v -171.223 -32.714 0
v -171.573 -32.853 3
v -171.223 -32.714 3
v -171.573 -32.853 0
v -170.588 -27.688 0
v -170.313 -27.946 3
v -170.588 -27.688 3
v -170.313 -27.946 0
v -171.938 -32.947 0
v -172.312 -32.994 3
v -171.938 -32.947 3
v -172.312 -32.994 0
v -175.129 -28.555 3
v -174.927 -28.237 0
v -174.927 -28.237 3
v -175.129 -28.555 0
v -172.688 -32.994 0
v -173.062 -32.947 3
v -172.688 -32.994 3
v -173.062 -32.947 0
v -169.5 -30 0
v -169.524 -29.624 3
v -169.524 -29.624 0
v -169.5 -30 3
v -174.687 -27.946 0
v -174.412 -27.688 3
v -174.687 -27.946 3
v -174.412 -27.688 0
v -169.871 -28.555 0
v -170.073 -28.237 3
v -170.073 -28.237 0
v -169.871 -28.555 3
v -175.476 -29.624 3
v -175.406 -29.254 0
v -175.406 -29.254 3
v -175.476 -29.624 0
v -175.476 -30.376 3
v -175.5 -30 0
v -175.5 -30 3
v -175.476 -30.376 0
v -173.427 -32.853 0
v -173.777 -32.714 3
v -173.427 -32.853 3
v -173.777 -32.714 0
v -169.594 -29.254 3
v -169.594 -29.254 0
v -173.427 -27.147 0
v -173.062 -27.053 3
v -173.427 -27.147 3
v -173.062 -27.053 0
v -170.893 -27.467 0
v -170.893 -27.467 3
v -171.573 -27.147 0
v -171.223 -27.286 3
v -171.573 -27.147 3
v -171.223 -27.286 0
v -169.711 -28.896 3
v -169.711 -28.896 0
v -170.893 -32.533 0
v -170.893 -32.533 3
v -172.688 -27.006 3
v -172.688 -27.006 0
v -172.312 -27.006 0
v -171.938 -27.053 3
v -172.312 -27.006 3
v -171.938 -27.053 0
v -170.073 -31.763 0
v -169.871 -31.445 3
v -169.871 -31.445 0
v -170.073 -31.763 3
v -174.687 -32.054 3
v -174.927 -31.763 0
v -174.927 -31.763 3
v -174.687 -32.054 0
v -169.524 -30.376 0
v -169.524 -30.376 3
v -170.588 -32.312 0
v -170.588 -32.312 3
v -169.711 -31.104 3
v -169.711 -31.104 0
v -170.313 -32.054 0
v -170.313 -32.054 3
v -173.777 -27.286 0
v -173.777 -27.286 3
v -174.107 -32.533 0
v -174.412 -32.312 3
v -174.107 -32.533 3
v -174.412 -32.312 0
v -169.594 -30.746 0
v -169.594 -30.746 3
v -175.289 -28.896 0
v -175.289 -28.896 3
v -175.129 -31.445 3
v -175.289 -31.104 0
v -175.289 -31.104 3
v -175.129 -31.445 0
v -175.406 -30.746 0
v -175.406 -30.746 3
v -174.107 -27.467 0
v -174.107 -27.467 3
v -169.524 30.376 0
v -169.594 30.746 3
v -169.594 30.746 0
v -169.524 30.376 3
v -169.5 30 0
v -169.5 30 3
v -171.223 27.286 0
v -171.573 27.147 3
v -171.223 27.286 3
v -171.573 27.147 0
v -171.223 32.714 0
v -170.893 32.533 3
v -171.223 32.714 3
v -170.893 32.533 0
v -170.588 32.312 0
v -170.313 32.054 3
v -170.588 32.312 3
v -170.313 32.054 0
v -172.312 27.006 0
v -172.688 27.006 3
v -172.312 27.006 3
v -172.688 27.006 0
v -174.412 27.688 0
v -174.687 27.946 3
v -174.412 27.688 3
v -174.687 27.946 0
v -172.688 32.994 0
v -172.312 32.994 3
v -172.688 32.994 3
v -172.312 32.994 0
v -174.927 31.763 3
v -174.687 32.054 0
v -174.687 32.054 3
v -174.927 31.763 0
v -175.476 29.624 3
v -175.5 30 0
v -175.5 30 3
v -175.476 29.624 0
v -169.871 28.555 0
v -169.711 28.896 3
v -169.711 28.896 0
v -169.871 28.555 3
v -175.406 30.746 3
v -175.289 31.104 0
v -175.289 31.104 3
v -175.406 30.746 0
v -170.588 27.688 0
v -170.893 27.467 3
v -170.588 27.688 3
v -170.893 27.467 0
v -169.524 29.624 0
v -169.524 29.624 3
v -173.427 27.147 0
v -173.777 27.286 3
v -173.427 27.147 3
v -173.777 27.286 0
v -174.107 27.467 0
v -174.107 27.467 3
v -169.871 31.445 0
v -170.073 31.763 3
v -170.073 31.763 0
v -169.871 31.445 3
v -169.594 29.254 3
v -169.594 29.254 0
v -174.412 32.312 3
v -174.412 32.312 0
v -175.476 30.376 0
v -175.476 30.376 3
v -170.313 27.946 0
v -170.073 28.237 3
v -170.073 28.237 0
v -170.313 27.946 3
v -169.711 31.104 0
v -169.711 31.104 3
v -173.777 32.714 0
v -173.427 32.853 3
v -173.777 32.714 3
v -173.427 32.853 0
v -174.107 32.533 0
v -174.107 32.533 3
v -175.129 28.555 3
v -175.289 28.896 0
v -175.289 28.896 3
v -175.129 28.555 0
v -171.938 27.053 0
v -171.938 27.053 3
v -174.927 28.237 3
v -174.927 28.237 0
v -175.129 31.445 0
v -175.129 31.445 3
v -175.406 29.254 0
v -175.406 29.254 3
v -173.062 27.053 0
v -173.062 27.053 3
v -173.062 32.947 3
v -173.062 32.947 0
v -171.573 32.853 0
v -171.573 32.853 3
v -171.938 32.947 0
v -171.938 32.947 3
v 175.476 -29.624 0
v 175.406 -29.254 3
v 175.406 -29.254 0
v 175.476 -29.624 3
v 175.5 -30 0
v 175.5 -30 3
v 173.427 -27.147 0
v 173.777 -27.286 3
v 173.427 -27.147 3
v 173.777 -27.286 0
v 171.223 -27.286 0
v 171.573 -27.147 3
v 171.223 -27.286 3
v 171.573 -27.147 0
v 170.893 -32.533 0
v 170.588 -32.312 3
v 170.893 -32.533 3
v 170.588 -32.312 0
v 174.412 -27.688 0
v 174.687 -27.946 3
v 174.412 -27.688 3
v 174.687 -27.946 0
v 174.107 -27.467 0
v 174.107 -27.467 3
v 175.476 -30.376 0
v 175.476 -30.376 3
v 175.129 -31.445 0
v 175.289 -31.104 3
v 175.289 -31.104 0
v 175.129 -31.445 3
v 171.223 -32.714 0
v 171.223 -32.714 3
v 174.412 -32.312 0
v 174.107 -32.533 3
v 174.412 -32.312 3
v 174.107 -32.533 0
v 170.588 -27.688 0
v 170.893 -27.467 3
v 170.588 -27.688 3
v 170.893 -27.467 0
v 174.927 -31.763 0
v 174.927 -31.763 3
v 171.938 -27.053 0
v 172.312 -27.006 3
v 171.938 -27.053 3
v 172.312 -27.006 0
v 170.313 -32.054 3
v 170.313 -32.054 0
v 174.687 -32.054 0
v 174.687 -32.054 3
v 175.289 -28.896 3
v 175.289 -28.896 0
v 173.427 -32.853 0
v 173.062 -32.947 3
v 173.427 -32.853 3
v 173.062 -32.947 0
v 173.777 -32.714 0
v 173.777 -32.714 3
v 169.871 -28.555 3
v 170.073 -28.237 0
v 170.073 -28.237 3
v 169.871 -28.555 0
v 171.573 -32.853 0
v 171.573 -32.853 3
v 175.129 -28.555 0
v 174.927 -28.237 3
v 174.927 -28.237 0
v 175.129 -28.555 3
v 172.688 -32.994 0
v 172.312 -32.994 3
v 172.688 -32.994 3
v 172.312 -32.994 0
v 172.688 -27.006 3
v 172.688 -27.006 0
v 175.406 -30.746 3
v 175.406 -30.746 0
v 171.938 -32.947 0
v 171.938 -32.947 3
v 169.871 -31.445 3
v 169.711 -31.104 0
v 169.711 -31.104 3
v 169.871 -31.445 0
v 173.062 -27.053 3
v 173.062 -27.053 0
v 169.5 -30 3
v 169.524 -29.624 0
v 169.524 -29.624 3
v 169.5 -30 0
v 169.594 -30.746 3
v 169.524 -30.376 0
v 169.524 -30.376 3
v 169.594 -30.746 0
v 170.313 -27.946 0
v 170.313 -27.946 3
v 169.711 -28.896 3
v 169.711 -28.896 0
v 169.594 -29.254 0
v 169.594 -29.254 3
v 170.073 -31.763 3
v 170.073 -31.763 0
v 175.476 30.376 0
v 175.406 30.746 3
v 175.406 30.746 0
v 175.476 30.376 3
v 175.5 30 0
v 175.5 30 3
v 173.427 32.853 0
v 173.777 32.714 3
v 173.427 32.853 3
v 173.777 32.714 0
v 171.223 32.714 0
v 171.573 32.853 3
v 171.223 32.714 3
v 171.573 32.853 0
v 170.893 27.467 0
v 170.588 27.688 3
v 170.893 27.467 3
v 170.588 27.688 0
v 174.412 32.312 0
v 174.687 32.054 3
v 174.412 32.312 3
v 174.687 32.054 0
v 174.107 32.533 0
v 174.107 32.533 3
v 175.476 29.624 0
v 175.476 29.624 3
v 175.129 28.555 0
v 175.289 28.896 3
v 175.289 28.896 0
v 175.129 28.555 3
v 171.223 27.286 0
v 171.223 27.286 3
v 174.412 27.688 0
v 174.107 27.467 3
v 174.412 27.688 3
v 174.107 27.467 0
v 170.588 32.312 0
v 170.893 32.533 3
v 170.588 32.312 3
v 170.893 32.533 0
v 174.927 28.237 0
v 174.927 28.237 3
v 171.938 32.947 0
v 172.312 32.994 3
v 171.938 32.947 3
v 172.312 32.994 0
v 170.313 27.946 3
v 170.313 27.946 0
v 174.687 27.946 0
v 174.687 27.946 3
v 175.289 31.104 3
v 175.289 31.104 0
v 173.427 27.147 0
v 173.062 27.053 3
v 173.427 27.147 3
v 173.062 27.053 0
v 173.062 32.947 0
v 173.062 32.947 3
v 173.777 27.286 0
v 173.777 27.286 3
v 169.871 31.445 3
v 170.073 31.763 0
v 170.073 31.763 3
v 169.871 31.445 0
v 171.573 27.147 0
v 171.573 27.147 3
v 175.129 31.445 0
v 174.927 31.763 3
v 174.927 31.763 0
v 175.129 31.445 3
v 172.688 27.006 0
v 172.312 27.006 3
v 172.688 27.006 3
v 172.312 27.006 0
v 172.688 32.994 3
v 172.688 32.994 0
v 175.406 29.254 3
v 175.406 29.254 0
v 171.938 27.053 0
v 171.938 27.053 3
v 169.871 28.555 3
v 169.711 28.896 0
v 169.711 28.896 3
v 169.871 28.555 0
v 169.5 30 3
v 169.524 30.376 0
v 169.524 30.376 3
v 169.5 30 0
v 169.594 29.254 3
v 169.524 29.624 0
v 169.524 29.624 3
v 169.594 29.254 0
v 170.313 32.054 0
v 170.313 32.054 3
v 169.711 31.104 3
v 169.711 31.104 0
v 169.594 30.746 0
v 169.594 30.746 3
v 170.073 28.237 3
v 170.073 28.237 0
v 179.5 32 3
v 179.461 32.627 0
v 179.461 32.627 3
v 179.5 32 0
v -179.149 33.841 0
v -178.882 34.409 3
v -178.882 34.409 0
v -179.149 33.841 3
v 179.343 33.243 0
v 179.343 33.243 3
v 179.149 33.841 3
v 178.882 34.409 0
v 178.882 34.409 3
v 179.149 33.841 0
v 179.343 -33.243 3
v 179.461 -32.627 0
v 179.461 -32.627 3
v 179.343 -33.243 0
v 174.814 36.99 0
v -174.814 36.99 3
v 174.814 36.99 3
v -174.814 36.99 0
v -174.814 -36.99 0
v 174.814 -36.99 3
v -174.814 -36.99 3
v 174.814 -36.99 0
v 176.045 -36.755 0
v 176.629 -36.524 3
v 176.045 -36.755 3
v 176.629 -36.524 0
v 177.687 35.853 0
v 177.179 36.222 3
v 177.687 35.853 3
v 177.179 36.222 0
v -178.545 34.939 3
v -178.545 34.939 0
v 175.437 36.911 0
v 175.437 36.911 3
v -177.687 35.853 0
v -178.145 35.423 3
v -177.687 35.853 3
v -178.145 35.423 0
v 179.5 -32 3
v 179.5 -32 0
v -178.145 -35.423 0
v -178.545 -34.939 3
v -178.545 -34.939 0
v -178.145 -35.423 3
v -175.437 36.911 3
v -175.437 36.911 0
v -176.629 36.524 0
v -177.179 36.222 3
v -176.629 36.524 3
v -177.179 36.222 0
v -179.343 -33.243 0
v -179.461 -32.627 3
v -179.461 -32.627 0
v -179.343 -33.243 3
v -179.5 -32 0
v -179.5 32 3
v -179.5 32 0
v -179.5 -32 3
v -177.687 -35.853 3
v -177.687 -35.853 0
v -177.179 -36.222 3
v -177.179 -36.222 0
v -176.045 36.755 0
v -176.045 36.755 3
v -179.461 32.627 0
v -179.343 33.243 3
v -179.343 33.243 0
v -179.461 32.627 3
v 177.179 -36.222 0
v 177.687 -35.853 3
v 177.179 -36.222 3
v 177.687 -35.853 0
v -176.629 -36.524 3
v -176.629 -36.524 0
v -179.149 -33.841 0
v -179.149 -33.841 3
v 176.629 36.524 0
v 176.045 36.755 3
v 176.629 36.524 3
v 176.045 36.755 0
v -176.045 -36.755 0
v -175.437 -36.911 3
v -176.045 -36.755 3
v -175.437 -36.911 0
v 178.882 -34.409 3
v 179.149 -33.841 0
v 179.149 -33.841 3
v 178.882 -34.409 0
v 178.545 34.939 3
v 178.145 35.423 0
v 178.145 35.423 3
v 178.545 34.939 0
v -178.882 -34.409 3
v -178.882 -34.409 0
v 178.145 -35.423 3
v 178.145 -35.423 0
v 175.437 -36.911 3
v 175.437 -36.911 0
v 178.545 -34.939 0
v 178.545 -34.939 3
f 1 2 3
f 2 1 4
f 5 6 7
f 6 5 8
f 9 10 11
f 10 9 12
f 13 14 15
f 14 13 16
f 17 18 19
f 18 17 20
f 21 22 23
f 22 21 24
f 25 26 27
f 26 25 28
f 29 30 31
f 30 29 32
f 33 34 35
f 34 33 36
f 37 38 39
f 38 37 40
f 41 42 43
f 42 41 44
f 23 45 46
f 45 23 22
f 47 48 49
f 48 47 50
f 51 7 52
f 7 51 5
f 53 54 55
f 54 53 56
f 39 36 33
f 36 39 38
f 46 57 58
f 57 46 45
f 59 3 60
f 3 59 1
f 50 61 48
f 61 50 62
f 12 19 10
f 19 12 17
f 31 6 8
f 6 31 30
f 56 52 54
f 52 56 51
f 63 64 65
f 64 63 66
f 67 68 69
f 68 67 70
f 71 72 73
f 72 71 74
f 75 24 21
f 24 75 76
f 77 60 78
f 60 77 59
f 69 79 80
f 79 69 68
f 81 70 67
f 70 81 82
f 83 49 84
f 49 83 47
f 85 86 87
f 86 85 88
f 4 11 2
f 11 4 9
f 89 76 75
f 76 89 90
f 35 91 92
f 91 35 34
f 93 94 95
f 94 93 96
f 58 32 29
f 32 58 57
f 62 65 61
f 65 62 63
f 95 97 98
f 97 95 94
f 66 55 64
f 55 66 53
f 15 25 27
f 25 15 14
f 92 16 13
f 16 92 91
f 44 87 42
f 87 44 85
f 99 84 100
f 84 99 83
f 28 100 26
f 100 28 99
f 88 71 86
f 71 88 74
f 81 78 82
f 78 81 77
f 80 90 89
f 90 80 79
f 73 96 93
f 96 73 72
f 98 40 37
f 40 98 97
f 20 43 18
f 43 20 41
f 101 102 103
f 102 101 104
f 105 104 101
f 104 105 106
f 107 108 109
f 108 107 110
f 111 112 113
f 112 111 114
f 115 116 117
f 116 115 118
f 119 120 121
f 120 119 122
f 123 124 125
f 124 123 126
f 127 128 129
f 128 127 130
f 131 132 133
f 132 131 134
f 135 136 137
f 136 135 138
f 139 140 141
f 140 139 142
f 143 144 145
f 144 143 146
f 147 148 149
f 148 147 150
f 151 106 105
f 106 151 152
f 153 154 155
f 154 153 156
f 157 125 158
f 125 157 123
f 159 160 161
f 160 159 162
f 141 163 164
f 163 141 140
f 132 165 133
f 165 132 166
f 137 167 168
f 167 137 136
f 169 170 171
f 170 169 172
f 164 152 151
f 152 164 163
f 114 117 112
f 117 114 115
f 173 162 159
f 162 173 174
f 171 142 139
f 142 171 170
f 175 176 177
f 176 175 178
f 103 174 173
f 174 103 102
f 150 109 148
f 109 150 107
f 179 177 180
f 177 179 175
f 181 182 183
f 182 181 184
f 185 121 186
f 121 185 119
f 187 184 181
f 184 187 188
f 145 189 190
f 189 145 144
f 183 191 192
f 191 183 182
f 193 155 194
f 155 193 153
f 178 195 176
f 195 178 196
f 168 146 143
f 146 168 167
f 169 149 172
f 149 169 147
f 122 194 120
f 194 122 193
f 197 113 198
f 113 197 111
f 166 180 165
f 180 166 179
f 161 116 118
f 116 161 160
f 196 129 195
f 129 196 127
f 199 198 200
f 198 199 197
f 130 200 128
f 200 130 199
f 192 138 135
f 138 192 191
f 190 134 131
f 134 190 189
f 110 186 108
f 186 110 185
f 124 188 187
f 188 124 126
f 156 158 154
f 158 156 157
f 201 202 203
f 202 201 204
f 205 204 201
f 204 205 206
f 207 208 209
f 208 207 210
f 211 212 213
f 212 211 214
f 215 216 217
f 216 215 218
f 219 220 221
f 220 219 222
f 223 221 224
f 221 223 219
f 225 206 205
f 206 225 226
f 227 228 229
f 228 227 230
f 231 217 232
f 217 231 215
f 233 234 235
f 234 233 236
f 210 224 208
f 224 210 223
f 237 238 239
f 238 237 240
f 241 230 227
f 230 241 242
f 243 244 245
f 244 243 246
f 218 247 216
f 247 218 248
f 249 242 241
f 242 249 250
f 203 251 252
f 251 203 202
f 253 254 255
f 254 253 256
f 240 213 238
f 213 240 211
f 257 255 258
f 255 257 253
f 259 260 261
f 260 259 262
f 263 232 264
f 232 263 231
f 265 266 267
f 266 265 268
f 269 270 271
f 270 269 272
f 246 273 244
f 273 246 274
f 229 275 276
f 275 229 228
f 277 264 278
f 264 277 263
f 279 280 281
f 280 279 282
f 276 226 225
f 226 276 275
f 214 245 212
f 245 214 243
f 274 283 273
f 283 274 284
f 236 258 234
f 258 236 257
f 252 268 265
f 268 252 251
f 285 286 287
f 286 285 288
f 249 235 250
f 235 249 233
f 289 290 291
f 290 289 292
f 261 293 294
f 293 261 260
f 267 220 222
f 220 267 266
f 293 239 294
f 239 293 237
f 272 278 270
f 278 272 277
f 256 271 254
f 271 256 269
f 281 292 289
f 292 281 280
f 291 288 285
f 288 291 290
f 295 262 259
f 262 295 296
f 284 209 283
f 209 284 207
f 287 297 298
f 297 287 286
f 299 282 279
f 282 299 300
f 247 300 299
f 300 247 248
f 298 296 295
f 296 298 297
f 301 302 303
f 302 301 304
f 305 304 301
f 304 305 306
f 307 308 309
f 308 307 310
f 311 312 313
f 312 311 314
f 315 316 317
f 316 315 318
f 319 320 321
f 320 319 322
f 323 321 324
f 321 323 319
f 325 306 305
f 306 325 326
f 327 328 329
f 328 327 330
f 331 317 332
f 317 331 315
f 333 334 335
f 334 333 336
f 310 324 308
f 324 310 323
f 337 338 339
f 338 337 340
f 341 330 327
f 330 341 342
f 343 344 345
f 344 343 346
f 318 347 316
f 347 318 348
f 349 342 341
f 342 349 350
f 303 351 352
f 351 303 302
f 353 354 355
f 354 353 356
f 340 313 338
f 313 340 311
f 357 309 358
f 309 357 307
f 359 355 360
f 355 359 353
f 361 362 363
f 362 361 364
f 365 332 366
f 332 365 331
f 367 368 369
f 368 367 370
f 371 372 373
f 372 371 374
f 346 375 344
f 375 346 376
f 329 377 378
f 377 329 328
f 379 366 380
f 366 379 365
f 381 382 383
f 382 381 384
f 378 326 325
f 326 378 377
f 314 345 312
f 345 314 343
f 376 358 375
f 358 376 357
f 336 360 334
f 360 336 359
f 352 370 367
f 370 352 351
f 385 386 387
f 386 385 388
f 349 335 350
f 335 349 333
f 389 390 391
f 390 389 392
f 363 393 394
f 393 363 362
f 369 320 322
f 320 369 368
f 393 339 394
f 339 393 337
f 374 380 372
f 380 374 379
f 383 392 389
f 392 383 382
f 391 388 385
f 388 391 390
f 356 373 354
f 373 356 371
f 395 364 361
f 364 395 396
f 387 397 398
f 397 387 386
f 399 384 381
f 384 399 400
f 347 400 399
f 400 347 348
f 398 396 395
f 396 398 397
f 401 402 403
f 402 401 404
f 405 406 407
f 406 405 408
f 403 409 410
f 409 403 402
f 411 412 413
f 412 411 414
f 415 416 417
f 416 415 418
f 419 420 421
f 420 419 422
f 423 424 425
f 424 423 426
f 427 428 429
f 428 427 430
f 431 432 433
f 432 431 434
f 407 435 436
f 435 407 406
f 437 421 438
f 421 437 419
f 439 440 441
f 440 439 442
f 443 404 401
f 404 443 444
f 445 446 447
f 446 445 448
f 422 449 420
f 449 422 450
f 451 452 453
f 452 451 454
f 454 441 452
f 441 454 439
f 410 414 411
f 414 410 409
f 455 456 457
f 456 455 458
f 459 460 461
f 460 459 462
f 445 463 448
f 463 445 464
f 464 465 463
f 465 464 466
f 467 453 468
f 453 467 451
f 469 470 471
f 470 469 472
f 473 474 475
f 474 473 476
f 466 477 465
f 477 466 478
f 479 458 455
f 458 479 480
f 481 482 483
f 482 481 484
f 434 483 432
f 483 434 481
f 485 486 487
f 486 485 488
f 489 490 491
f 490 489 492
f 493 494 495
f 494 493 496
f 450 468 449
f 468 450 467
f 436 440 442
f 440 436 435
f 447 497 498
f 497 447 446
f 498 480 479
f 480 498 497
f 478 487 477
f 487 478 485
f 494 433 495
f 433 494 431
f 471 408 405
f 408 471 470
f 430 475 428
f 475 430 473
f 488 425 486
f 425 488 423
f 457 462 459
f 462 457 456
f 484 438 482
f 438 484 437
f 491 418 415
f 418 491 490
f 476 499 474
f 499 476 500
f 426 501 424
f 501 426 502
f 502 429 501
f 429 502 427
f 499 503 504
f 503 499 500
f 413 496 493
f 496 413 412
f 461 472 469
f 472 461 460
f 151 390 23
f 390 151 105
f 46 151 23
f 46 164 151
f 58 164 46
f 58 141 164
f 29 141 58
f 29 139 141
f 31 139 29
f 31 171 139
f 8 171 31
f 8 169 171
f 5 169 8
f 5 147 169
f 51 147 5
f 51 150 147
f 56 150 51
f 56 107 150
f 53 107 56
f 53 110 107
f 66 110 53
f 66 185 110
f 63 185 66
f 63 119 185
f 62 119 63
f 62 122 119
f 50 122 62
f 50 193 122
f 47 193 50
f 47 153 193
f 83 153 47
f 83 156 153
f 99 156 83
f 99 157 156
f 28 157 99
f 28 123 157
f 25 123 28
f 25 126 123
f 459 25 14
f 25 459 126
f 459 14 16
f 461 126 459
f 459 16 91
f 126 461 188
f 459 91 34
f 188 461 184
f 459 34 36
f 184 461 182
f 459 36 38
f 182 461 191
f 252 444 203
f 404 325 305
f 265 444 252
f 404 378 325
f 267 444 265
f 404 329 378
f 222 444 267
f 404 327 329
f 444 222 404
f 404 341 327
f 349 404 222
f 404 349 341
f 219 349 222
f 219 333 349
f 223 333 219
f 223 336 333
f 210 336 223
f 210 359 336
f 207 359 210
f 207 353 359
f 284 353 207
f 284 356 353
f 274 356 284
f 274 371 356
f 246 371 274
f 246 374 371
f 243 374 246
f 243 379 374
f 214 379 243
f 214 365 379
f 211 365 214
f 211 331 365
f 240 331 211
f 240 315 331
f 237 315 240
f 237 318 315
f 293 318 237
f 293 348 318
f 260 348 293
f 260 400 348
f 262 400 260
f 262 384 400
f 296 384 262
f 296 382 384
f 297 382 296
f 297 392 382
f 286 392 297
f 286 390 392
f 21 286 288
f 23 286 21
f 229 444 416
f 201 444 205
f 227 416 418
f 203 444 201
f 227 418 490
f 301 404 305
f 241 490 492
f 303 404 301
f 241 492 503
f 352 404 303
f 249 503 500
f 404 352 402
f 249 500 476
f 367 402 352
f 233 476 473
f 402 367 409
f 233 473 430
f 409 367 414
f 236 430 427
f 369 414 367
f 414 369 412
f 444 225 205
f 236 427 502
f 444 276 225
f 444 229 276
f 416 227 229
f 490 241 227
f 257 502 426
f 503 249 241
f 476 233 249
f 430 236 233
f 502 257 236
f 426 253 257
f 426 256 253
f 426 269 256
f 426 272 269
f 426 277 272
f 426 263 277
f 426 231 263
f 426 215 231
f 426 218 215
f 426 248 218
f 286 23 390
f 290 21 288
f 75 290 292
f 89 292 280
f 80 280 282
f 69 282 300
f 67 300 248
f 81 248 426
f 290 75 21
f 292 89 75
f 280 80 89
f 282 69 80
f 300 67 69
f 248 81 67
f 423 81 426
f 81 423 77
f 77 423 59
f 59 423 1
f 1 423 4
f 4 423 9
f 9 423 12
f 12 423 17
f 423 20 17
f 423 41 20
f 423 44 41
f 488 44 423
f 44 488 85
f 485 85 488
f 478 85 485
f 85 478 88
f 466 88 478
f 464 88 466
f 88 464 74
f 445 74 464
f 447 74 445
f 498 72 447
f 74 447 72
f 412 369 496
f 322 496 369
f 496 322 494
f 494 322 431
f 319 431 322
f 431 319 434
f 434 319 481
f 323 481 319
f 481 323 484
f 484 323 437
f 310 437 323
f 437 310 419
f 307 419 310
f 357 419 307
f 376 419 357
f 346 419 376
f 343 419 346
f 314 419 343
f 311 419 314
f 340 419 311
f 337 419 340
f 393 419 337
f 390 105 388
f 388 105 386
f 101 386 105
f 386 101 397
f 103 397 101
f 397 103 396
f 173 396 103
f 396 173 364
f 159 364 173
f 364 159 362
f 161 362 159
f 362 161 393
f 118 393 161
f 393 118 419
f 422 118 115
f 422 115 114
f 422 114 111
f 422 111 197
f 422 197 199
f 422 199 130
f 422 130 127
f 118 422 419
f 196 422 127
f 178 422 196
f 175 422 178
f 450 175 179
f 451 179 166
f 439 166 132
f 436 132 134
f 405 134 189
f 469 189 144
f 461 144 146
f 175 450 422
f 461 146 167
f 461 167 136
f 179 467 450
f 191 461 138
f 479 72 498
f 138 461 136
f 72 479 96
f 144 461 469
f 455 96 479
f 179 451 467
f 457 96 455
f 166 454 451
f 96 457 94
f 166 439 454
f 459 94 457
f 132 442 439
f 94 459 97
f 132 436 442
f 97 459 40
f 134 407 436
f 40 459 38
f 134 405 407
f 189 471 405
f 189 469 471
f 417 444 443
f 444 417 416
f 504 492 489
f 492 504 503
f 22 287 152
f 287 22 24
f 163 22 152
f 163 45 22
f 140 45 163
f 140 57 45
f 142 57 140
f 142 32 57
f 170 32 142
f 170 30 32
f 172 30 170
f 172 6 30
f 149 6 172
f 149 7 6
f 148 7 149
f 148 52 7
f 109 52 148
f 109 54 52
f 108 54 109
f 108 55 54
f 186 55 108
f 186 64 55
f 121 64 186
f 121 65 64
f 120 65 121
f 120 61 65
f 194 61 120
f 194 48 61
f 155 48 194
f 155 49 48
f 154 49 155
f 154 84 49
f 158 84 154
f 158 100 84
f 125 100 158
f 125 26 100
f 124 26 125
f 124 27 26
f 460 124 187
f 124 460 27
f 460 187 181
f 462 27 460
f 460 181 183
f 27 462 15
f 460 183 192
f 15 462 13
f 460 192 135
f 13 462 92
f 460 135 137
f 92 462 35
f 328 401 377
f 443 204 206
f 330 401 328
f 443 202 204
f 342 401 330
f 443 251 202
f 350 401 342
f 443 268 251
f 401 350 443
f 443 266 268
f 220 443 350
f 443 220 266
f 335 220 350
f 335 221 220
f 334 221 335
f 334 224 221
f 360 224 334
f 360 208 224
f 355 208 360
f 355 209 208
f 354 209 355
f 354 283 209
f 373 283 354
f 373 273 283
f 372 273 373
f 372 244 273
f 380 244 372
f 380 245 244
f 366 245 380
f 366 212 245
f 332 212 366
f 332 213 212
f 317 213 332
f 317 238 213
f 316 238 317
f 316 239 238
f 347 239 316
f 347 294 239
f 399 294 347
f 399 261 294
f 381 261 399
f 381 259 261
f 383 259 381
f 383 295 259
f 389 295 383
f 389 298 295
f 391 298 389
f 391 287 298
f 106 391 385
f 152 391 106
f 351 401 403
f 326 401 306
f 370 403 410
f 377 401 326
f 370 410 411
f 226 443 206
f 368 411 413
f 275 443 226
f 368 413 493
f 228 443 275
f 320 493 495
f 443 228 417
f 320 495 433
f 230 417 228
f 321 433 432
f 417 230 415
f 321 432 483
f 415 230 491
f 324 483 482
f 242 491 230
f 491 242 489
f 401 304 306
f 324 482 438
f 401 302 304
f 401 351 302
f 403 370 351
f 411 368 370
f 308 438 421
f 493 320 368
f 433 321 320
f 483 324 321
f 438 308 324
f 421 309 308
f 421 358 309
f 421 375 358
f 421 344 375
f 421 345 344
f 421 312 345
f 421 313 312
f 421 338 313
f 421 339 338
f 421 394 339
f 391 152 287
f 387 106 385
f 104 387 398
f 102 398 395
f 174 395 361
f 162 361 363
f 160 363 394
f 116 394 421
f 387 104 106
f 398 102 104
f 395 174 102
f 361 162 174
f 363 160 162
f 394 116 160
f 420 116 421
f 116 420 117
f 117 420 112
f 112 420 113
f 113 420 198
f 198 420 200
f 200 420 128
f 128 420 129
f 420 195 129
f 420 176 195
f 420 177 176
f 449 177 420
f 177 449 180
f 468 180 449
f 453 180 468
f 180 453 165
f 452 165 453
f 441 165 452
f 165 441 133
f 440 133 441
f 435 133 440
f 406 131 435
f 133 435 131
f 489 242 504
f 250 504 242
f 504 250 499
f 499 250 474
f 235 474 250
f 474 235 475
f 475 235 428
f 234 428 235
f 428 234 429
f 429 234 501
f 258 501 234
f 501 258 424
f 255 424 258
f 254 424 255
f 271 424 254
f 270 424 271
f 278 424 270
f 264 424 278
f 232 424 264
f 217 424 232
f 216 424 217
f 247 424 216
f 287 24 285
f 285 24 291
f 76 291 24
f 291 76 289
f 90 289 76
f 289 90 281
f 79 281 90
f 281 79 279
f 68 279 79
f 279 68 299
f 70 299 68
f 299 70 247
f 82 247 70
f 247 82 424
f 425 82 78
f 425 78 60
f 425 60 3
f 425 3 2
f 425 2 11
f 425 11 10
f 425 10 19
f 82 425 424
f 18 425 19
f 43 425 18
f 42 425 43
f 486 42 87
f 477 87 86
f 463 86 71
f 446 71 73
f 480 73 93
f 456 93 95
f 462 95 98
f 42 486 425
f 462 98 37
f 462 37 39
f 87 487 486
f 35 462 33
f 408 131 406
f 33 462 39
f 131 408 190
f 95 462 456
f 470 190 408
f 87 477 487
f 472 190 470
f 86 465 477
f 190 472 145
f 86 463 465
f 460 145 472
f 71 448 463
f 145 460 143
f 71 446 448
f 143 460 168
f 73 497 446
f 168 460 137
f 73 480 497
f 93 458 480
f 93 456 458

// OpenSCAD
$fn = 50;


difference() {
	union() {
		hull() {
			translate(v = [-174.5000000000, 32.0000000000, 0]) {
				cylinder(h = 3, r = 5);
			}
			translate(v = [174.5000000000, 32.0000000000, 0]) {
				cylinder(h = 3, r = 5);
			}
			translate(v = [-174.5000000000, -32.0000000000, 0]) {
				cylinder(h = 3, r = 5);
			}
			translate(v = [174.5000000000, -32.0000000000, 0]) {
				cylinder(h = 3, r = 5);
			}
		}
	}
	union() {
		translate(v = [-172.5000000000, -30.0000000000, -100.0000000000]) {
			cylinder(h = 200, r = 3.0000000000);
		}
		translate(v = [-172.5000000000, 30.0000000000, -100.0000000000]) {
			cylinder(h = 200, r = 3.0000000000);
		}
		translate(v = [172.5000000000, -30.0000000000, -100.0000000000]) {
			cylinder(h = 200, r = 3.0000000000);
		}
		translate(v = [172.5000000000, 30.0000000000, -100.0000000000]) {
			cylinder(h = 200, r = 3.0000000000);
		}
	}
}
